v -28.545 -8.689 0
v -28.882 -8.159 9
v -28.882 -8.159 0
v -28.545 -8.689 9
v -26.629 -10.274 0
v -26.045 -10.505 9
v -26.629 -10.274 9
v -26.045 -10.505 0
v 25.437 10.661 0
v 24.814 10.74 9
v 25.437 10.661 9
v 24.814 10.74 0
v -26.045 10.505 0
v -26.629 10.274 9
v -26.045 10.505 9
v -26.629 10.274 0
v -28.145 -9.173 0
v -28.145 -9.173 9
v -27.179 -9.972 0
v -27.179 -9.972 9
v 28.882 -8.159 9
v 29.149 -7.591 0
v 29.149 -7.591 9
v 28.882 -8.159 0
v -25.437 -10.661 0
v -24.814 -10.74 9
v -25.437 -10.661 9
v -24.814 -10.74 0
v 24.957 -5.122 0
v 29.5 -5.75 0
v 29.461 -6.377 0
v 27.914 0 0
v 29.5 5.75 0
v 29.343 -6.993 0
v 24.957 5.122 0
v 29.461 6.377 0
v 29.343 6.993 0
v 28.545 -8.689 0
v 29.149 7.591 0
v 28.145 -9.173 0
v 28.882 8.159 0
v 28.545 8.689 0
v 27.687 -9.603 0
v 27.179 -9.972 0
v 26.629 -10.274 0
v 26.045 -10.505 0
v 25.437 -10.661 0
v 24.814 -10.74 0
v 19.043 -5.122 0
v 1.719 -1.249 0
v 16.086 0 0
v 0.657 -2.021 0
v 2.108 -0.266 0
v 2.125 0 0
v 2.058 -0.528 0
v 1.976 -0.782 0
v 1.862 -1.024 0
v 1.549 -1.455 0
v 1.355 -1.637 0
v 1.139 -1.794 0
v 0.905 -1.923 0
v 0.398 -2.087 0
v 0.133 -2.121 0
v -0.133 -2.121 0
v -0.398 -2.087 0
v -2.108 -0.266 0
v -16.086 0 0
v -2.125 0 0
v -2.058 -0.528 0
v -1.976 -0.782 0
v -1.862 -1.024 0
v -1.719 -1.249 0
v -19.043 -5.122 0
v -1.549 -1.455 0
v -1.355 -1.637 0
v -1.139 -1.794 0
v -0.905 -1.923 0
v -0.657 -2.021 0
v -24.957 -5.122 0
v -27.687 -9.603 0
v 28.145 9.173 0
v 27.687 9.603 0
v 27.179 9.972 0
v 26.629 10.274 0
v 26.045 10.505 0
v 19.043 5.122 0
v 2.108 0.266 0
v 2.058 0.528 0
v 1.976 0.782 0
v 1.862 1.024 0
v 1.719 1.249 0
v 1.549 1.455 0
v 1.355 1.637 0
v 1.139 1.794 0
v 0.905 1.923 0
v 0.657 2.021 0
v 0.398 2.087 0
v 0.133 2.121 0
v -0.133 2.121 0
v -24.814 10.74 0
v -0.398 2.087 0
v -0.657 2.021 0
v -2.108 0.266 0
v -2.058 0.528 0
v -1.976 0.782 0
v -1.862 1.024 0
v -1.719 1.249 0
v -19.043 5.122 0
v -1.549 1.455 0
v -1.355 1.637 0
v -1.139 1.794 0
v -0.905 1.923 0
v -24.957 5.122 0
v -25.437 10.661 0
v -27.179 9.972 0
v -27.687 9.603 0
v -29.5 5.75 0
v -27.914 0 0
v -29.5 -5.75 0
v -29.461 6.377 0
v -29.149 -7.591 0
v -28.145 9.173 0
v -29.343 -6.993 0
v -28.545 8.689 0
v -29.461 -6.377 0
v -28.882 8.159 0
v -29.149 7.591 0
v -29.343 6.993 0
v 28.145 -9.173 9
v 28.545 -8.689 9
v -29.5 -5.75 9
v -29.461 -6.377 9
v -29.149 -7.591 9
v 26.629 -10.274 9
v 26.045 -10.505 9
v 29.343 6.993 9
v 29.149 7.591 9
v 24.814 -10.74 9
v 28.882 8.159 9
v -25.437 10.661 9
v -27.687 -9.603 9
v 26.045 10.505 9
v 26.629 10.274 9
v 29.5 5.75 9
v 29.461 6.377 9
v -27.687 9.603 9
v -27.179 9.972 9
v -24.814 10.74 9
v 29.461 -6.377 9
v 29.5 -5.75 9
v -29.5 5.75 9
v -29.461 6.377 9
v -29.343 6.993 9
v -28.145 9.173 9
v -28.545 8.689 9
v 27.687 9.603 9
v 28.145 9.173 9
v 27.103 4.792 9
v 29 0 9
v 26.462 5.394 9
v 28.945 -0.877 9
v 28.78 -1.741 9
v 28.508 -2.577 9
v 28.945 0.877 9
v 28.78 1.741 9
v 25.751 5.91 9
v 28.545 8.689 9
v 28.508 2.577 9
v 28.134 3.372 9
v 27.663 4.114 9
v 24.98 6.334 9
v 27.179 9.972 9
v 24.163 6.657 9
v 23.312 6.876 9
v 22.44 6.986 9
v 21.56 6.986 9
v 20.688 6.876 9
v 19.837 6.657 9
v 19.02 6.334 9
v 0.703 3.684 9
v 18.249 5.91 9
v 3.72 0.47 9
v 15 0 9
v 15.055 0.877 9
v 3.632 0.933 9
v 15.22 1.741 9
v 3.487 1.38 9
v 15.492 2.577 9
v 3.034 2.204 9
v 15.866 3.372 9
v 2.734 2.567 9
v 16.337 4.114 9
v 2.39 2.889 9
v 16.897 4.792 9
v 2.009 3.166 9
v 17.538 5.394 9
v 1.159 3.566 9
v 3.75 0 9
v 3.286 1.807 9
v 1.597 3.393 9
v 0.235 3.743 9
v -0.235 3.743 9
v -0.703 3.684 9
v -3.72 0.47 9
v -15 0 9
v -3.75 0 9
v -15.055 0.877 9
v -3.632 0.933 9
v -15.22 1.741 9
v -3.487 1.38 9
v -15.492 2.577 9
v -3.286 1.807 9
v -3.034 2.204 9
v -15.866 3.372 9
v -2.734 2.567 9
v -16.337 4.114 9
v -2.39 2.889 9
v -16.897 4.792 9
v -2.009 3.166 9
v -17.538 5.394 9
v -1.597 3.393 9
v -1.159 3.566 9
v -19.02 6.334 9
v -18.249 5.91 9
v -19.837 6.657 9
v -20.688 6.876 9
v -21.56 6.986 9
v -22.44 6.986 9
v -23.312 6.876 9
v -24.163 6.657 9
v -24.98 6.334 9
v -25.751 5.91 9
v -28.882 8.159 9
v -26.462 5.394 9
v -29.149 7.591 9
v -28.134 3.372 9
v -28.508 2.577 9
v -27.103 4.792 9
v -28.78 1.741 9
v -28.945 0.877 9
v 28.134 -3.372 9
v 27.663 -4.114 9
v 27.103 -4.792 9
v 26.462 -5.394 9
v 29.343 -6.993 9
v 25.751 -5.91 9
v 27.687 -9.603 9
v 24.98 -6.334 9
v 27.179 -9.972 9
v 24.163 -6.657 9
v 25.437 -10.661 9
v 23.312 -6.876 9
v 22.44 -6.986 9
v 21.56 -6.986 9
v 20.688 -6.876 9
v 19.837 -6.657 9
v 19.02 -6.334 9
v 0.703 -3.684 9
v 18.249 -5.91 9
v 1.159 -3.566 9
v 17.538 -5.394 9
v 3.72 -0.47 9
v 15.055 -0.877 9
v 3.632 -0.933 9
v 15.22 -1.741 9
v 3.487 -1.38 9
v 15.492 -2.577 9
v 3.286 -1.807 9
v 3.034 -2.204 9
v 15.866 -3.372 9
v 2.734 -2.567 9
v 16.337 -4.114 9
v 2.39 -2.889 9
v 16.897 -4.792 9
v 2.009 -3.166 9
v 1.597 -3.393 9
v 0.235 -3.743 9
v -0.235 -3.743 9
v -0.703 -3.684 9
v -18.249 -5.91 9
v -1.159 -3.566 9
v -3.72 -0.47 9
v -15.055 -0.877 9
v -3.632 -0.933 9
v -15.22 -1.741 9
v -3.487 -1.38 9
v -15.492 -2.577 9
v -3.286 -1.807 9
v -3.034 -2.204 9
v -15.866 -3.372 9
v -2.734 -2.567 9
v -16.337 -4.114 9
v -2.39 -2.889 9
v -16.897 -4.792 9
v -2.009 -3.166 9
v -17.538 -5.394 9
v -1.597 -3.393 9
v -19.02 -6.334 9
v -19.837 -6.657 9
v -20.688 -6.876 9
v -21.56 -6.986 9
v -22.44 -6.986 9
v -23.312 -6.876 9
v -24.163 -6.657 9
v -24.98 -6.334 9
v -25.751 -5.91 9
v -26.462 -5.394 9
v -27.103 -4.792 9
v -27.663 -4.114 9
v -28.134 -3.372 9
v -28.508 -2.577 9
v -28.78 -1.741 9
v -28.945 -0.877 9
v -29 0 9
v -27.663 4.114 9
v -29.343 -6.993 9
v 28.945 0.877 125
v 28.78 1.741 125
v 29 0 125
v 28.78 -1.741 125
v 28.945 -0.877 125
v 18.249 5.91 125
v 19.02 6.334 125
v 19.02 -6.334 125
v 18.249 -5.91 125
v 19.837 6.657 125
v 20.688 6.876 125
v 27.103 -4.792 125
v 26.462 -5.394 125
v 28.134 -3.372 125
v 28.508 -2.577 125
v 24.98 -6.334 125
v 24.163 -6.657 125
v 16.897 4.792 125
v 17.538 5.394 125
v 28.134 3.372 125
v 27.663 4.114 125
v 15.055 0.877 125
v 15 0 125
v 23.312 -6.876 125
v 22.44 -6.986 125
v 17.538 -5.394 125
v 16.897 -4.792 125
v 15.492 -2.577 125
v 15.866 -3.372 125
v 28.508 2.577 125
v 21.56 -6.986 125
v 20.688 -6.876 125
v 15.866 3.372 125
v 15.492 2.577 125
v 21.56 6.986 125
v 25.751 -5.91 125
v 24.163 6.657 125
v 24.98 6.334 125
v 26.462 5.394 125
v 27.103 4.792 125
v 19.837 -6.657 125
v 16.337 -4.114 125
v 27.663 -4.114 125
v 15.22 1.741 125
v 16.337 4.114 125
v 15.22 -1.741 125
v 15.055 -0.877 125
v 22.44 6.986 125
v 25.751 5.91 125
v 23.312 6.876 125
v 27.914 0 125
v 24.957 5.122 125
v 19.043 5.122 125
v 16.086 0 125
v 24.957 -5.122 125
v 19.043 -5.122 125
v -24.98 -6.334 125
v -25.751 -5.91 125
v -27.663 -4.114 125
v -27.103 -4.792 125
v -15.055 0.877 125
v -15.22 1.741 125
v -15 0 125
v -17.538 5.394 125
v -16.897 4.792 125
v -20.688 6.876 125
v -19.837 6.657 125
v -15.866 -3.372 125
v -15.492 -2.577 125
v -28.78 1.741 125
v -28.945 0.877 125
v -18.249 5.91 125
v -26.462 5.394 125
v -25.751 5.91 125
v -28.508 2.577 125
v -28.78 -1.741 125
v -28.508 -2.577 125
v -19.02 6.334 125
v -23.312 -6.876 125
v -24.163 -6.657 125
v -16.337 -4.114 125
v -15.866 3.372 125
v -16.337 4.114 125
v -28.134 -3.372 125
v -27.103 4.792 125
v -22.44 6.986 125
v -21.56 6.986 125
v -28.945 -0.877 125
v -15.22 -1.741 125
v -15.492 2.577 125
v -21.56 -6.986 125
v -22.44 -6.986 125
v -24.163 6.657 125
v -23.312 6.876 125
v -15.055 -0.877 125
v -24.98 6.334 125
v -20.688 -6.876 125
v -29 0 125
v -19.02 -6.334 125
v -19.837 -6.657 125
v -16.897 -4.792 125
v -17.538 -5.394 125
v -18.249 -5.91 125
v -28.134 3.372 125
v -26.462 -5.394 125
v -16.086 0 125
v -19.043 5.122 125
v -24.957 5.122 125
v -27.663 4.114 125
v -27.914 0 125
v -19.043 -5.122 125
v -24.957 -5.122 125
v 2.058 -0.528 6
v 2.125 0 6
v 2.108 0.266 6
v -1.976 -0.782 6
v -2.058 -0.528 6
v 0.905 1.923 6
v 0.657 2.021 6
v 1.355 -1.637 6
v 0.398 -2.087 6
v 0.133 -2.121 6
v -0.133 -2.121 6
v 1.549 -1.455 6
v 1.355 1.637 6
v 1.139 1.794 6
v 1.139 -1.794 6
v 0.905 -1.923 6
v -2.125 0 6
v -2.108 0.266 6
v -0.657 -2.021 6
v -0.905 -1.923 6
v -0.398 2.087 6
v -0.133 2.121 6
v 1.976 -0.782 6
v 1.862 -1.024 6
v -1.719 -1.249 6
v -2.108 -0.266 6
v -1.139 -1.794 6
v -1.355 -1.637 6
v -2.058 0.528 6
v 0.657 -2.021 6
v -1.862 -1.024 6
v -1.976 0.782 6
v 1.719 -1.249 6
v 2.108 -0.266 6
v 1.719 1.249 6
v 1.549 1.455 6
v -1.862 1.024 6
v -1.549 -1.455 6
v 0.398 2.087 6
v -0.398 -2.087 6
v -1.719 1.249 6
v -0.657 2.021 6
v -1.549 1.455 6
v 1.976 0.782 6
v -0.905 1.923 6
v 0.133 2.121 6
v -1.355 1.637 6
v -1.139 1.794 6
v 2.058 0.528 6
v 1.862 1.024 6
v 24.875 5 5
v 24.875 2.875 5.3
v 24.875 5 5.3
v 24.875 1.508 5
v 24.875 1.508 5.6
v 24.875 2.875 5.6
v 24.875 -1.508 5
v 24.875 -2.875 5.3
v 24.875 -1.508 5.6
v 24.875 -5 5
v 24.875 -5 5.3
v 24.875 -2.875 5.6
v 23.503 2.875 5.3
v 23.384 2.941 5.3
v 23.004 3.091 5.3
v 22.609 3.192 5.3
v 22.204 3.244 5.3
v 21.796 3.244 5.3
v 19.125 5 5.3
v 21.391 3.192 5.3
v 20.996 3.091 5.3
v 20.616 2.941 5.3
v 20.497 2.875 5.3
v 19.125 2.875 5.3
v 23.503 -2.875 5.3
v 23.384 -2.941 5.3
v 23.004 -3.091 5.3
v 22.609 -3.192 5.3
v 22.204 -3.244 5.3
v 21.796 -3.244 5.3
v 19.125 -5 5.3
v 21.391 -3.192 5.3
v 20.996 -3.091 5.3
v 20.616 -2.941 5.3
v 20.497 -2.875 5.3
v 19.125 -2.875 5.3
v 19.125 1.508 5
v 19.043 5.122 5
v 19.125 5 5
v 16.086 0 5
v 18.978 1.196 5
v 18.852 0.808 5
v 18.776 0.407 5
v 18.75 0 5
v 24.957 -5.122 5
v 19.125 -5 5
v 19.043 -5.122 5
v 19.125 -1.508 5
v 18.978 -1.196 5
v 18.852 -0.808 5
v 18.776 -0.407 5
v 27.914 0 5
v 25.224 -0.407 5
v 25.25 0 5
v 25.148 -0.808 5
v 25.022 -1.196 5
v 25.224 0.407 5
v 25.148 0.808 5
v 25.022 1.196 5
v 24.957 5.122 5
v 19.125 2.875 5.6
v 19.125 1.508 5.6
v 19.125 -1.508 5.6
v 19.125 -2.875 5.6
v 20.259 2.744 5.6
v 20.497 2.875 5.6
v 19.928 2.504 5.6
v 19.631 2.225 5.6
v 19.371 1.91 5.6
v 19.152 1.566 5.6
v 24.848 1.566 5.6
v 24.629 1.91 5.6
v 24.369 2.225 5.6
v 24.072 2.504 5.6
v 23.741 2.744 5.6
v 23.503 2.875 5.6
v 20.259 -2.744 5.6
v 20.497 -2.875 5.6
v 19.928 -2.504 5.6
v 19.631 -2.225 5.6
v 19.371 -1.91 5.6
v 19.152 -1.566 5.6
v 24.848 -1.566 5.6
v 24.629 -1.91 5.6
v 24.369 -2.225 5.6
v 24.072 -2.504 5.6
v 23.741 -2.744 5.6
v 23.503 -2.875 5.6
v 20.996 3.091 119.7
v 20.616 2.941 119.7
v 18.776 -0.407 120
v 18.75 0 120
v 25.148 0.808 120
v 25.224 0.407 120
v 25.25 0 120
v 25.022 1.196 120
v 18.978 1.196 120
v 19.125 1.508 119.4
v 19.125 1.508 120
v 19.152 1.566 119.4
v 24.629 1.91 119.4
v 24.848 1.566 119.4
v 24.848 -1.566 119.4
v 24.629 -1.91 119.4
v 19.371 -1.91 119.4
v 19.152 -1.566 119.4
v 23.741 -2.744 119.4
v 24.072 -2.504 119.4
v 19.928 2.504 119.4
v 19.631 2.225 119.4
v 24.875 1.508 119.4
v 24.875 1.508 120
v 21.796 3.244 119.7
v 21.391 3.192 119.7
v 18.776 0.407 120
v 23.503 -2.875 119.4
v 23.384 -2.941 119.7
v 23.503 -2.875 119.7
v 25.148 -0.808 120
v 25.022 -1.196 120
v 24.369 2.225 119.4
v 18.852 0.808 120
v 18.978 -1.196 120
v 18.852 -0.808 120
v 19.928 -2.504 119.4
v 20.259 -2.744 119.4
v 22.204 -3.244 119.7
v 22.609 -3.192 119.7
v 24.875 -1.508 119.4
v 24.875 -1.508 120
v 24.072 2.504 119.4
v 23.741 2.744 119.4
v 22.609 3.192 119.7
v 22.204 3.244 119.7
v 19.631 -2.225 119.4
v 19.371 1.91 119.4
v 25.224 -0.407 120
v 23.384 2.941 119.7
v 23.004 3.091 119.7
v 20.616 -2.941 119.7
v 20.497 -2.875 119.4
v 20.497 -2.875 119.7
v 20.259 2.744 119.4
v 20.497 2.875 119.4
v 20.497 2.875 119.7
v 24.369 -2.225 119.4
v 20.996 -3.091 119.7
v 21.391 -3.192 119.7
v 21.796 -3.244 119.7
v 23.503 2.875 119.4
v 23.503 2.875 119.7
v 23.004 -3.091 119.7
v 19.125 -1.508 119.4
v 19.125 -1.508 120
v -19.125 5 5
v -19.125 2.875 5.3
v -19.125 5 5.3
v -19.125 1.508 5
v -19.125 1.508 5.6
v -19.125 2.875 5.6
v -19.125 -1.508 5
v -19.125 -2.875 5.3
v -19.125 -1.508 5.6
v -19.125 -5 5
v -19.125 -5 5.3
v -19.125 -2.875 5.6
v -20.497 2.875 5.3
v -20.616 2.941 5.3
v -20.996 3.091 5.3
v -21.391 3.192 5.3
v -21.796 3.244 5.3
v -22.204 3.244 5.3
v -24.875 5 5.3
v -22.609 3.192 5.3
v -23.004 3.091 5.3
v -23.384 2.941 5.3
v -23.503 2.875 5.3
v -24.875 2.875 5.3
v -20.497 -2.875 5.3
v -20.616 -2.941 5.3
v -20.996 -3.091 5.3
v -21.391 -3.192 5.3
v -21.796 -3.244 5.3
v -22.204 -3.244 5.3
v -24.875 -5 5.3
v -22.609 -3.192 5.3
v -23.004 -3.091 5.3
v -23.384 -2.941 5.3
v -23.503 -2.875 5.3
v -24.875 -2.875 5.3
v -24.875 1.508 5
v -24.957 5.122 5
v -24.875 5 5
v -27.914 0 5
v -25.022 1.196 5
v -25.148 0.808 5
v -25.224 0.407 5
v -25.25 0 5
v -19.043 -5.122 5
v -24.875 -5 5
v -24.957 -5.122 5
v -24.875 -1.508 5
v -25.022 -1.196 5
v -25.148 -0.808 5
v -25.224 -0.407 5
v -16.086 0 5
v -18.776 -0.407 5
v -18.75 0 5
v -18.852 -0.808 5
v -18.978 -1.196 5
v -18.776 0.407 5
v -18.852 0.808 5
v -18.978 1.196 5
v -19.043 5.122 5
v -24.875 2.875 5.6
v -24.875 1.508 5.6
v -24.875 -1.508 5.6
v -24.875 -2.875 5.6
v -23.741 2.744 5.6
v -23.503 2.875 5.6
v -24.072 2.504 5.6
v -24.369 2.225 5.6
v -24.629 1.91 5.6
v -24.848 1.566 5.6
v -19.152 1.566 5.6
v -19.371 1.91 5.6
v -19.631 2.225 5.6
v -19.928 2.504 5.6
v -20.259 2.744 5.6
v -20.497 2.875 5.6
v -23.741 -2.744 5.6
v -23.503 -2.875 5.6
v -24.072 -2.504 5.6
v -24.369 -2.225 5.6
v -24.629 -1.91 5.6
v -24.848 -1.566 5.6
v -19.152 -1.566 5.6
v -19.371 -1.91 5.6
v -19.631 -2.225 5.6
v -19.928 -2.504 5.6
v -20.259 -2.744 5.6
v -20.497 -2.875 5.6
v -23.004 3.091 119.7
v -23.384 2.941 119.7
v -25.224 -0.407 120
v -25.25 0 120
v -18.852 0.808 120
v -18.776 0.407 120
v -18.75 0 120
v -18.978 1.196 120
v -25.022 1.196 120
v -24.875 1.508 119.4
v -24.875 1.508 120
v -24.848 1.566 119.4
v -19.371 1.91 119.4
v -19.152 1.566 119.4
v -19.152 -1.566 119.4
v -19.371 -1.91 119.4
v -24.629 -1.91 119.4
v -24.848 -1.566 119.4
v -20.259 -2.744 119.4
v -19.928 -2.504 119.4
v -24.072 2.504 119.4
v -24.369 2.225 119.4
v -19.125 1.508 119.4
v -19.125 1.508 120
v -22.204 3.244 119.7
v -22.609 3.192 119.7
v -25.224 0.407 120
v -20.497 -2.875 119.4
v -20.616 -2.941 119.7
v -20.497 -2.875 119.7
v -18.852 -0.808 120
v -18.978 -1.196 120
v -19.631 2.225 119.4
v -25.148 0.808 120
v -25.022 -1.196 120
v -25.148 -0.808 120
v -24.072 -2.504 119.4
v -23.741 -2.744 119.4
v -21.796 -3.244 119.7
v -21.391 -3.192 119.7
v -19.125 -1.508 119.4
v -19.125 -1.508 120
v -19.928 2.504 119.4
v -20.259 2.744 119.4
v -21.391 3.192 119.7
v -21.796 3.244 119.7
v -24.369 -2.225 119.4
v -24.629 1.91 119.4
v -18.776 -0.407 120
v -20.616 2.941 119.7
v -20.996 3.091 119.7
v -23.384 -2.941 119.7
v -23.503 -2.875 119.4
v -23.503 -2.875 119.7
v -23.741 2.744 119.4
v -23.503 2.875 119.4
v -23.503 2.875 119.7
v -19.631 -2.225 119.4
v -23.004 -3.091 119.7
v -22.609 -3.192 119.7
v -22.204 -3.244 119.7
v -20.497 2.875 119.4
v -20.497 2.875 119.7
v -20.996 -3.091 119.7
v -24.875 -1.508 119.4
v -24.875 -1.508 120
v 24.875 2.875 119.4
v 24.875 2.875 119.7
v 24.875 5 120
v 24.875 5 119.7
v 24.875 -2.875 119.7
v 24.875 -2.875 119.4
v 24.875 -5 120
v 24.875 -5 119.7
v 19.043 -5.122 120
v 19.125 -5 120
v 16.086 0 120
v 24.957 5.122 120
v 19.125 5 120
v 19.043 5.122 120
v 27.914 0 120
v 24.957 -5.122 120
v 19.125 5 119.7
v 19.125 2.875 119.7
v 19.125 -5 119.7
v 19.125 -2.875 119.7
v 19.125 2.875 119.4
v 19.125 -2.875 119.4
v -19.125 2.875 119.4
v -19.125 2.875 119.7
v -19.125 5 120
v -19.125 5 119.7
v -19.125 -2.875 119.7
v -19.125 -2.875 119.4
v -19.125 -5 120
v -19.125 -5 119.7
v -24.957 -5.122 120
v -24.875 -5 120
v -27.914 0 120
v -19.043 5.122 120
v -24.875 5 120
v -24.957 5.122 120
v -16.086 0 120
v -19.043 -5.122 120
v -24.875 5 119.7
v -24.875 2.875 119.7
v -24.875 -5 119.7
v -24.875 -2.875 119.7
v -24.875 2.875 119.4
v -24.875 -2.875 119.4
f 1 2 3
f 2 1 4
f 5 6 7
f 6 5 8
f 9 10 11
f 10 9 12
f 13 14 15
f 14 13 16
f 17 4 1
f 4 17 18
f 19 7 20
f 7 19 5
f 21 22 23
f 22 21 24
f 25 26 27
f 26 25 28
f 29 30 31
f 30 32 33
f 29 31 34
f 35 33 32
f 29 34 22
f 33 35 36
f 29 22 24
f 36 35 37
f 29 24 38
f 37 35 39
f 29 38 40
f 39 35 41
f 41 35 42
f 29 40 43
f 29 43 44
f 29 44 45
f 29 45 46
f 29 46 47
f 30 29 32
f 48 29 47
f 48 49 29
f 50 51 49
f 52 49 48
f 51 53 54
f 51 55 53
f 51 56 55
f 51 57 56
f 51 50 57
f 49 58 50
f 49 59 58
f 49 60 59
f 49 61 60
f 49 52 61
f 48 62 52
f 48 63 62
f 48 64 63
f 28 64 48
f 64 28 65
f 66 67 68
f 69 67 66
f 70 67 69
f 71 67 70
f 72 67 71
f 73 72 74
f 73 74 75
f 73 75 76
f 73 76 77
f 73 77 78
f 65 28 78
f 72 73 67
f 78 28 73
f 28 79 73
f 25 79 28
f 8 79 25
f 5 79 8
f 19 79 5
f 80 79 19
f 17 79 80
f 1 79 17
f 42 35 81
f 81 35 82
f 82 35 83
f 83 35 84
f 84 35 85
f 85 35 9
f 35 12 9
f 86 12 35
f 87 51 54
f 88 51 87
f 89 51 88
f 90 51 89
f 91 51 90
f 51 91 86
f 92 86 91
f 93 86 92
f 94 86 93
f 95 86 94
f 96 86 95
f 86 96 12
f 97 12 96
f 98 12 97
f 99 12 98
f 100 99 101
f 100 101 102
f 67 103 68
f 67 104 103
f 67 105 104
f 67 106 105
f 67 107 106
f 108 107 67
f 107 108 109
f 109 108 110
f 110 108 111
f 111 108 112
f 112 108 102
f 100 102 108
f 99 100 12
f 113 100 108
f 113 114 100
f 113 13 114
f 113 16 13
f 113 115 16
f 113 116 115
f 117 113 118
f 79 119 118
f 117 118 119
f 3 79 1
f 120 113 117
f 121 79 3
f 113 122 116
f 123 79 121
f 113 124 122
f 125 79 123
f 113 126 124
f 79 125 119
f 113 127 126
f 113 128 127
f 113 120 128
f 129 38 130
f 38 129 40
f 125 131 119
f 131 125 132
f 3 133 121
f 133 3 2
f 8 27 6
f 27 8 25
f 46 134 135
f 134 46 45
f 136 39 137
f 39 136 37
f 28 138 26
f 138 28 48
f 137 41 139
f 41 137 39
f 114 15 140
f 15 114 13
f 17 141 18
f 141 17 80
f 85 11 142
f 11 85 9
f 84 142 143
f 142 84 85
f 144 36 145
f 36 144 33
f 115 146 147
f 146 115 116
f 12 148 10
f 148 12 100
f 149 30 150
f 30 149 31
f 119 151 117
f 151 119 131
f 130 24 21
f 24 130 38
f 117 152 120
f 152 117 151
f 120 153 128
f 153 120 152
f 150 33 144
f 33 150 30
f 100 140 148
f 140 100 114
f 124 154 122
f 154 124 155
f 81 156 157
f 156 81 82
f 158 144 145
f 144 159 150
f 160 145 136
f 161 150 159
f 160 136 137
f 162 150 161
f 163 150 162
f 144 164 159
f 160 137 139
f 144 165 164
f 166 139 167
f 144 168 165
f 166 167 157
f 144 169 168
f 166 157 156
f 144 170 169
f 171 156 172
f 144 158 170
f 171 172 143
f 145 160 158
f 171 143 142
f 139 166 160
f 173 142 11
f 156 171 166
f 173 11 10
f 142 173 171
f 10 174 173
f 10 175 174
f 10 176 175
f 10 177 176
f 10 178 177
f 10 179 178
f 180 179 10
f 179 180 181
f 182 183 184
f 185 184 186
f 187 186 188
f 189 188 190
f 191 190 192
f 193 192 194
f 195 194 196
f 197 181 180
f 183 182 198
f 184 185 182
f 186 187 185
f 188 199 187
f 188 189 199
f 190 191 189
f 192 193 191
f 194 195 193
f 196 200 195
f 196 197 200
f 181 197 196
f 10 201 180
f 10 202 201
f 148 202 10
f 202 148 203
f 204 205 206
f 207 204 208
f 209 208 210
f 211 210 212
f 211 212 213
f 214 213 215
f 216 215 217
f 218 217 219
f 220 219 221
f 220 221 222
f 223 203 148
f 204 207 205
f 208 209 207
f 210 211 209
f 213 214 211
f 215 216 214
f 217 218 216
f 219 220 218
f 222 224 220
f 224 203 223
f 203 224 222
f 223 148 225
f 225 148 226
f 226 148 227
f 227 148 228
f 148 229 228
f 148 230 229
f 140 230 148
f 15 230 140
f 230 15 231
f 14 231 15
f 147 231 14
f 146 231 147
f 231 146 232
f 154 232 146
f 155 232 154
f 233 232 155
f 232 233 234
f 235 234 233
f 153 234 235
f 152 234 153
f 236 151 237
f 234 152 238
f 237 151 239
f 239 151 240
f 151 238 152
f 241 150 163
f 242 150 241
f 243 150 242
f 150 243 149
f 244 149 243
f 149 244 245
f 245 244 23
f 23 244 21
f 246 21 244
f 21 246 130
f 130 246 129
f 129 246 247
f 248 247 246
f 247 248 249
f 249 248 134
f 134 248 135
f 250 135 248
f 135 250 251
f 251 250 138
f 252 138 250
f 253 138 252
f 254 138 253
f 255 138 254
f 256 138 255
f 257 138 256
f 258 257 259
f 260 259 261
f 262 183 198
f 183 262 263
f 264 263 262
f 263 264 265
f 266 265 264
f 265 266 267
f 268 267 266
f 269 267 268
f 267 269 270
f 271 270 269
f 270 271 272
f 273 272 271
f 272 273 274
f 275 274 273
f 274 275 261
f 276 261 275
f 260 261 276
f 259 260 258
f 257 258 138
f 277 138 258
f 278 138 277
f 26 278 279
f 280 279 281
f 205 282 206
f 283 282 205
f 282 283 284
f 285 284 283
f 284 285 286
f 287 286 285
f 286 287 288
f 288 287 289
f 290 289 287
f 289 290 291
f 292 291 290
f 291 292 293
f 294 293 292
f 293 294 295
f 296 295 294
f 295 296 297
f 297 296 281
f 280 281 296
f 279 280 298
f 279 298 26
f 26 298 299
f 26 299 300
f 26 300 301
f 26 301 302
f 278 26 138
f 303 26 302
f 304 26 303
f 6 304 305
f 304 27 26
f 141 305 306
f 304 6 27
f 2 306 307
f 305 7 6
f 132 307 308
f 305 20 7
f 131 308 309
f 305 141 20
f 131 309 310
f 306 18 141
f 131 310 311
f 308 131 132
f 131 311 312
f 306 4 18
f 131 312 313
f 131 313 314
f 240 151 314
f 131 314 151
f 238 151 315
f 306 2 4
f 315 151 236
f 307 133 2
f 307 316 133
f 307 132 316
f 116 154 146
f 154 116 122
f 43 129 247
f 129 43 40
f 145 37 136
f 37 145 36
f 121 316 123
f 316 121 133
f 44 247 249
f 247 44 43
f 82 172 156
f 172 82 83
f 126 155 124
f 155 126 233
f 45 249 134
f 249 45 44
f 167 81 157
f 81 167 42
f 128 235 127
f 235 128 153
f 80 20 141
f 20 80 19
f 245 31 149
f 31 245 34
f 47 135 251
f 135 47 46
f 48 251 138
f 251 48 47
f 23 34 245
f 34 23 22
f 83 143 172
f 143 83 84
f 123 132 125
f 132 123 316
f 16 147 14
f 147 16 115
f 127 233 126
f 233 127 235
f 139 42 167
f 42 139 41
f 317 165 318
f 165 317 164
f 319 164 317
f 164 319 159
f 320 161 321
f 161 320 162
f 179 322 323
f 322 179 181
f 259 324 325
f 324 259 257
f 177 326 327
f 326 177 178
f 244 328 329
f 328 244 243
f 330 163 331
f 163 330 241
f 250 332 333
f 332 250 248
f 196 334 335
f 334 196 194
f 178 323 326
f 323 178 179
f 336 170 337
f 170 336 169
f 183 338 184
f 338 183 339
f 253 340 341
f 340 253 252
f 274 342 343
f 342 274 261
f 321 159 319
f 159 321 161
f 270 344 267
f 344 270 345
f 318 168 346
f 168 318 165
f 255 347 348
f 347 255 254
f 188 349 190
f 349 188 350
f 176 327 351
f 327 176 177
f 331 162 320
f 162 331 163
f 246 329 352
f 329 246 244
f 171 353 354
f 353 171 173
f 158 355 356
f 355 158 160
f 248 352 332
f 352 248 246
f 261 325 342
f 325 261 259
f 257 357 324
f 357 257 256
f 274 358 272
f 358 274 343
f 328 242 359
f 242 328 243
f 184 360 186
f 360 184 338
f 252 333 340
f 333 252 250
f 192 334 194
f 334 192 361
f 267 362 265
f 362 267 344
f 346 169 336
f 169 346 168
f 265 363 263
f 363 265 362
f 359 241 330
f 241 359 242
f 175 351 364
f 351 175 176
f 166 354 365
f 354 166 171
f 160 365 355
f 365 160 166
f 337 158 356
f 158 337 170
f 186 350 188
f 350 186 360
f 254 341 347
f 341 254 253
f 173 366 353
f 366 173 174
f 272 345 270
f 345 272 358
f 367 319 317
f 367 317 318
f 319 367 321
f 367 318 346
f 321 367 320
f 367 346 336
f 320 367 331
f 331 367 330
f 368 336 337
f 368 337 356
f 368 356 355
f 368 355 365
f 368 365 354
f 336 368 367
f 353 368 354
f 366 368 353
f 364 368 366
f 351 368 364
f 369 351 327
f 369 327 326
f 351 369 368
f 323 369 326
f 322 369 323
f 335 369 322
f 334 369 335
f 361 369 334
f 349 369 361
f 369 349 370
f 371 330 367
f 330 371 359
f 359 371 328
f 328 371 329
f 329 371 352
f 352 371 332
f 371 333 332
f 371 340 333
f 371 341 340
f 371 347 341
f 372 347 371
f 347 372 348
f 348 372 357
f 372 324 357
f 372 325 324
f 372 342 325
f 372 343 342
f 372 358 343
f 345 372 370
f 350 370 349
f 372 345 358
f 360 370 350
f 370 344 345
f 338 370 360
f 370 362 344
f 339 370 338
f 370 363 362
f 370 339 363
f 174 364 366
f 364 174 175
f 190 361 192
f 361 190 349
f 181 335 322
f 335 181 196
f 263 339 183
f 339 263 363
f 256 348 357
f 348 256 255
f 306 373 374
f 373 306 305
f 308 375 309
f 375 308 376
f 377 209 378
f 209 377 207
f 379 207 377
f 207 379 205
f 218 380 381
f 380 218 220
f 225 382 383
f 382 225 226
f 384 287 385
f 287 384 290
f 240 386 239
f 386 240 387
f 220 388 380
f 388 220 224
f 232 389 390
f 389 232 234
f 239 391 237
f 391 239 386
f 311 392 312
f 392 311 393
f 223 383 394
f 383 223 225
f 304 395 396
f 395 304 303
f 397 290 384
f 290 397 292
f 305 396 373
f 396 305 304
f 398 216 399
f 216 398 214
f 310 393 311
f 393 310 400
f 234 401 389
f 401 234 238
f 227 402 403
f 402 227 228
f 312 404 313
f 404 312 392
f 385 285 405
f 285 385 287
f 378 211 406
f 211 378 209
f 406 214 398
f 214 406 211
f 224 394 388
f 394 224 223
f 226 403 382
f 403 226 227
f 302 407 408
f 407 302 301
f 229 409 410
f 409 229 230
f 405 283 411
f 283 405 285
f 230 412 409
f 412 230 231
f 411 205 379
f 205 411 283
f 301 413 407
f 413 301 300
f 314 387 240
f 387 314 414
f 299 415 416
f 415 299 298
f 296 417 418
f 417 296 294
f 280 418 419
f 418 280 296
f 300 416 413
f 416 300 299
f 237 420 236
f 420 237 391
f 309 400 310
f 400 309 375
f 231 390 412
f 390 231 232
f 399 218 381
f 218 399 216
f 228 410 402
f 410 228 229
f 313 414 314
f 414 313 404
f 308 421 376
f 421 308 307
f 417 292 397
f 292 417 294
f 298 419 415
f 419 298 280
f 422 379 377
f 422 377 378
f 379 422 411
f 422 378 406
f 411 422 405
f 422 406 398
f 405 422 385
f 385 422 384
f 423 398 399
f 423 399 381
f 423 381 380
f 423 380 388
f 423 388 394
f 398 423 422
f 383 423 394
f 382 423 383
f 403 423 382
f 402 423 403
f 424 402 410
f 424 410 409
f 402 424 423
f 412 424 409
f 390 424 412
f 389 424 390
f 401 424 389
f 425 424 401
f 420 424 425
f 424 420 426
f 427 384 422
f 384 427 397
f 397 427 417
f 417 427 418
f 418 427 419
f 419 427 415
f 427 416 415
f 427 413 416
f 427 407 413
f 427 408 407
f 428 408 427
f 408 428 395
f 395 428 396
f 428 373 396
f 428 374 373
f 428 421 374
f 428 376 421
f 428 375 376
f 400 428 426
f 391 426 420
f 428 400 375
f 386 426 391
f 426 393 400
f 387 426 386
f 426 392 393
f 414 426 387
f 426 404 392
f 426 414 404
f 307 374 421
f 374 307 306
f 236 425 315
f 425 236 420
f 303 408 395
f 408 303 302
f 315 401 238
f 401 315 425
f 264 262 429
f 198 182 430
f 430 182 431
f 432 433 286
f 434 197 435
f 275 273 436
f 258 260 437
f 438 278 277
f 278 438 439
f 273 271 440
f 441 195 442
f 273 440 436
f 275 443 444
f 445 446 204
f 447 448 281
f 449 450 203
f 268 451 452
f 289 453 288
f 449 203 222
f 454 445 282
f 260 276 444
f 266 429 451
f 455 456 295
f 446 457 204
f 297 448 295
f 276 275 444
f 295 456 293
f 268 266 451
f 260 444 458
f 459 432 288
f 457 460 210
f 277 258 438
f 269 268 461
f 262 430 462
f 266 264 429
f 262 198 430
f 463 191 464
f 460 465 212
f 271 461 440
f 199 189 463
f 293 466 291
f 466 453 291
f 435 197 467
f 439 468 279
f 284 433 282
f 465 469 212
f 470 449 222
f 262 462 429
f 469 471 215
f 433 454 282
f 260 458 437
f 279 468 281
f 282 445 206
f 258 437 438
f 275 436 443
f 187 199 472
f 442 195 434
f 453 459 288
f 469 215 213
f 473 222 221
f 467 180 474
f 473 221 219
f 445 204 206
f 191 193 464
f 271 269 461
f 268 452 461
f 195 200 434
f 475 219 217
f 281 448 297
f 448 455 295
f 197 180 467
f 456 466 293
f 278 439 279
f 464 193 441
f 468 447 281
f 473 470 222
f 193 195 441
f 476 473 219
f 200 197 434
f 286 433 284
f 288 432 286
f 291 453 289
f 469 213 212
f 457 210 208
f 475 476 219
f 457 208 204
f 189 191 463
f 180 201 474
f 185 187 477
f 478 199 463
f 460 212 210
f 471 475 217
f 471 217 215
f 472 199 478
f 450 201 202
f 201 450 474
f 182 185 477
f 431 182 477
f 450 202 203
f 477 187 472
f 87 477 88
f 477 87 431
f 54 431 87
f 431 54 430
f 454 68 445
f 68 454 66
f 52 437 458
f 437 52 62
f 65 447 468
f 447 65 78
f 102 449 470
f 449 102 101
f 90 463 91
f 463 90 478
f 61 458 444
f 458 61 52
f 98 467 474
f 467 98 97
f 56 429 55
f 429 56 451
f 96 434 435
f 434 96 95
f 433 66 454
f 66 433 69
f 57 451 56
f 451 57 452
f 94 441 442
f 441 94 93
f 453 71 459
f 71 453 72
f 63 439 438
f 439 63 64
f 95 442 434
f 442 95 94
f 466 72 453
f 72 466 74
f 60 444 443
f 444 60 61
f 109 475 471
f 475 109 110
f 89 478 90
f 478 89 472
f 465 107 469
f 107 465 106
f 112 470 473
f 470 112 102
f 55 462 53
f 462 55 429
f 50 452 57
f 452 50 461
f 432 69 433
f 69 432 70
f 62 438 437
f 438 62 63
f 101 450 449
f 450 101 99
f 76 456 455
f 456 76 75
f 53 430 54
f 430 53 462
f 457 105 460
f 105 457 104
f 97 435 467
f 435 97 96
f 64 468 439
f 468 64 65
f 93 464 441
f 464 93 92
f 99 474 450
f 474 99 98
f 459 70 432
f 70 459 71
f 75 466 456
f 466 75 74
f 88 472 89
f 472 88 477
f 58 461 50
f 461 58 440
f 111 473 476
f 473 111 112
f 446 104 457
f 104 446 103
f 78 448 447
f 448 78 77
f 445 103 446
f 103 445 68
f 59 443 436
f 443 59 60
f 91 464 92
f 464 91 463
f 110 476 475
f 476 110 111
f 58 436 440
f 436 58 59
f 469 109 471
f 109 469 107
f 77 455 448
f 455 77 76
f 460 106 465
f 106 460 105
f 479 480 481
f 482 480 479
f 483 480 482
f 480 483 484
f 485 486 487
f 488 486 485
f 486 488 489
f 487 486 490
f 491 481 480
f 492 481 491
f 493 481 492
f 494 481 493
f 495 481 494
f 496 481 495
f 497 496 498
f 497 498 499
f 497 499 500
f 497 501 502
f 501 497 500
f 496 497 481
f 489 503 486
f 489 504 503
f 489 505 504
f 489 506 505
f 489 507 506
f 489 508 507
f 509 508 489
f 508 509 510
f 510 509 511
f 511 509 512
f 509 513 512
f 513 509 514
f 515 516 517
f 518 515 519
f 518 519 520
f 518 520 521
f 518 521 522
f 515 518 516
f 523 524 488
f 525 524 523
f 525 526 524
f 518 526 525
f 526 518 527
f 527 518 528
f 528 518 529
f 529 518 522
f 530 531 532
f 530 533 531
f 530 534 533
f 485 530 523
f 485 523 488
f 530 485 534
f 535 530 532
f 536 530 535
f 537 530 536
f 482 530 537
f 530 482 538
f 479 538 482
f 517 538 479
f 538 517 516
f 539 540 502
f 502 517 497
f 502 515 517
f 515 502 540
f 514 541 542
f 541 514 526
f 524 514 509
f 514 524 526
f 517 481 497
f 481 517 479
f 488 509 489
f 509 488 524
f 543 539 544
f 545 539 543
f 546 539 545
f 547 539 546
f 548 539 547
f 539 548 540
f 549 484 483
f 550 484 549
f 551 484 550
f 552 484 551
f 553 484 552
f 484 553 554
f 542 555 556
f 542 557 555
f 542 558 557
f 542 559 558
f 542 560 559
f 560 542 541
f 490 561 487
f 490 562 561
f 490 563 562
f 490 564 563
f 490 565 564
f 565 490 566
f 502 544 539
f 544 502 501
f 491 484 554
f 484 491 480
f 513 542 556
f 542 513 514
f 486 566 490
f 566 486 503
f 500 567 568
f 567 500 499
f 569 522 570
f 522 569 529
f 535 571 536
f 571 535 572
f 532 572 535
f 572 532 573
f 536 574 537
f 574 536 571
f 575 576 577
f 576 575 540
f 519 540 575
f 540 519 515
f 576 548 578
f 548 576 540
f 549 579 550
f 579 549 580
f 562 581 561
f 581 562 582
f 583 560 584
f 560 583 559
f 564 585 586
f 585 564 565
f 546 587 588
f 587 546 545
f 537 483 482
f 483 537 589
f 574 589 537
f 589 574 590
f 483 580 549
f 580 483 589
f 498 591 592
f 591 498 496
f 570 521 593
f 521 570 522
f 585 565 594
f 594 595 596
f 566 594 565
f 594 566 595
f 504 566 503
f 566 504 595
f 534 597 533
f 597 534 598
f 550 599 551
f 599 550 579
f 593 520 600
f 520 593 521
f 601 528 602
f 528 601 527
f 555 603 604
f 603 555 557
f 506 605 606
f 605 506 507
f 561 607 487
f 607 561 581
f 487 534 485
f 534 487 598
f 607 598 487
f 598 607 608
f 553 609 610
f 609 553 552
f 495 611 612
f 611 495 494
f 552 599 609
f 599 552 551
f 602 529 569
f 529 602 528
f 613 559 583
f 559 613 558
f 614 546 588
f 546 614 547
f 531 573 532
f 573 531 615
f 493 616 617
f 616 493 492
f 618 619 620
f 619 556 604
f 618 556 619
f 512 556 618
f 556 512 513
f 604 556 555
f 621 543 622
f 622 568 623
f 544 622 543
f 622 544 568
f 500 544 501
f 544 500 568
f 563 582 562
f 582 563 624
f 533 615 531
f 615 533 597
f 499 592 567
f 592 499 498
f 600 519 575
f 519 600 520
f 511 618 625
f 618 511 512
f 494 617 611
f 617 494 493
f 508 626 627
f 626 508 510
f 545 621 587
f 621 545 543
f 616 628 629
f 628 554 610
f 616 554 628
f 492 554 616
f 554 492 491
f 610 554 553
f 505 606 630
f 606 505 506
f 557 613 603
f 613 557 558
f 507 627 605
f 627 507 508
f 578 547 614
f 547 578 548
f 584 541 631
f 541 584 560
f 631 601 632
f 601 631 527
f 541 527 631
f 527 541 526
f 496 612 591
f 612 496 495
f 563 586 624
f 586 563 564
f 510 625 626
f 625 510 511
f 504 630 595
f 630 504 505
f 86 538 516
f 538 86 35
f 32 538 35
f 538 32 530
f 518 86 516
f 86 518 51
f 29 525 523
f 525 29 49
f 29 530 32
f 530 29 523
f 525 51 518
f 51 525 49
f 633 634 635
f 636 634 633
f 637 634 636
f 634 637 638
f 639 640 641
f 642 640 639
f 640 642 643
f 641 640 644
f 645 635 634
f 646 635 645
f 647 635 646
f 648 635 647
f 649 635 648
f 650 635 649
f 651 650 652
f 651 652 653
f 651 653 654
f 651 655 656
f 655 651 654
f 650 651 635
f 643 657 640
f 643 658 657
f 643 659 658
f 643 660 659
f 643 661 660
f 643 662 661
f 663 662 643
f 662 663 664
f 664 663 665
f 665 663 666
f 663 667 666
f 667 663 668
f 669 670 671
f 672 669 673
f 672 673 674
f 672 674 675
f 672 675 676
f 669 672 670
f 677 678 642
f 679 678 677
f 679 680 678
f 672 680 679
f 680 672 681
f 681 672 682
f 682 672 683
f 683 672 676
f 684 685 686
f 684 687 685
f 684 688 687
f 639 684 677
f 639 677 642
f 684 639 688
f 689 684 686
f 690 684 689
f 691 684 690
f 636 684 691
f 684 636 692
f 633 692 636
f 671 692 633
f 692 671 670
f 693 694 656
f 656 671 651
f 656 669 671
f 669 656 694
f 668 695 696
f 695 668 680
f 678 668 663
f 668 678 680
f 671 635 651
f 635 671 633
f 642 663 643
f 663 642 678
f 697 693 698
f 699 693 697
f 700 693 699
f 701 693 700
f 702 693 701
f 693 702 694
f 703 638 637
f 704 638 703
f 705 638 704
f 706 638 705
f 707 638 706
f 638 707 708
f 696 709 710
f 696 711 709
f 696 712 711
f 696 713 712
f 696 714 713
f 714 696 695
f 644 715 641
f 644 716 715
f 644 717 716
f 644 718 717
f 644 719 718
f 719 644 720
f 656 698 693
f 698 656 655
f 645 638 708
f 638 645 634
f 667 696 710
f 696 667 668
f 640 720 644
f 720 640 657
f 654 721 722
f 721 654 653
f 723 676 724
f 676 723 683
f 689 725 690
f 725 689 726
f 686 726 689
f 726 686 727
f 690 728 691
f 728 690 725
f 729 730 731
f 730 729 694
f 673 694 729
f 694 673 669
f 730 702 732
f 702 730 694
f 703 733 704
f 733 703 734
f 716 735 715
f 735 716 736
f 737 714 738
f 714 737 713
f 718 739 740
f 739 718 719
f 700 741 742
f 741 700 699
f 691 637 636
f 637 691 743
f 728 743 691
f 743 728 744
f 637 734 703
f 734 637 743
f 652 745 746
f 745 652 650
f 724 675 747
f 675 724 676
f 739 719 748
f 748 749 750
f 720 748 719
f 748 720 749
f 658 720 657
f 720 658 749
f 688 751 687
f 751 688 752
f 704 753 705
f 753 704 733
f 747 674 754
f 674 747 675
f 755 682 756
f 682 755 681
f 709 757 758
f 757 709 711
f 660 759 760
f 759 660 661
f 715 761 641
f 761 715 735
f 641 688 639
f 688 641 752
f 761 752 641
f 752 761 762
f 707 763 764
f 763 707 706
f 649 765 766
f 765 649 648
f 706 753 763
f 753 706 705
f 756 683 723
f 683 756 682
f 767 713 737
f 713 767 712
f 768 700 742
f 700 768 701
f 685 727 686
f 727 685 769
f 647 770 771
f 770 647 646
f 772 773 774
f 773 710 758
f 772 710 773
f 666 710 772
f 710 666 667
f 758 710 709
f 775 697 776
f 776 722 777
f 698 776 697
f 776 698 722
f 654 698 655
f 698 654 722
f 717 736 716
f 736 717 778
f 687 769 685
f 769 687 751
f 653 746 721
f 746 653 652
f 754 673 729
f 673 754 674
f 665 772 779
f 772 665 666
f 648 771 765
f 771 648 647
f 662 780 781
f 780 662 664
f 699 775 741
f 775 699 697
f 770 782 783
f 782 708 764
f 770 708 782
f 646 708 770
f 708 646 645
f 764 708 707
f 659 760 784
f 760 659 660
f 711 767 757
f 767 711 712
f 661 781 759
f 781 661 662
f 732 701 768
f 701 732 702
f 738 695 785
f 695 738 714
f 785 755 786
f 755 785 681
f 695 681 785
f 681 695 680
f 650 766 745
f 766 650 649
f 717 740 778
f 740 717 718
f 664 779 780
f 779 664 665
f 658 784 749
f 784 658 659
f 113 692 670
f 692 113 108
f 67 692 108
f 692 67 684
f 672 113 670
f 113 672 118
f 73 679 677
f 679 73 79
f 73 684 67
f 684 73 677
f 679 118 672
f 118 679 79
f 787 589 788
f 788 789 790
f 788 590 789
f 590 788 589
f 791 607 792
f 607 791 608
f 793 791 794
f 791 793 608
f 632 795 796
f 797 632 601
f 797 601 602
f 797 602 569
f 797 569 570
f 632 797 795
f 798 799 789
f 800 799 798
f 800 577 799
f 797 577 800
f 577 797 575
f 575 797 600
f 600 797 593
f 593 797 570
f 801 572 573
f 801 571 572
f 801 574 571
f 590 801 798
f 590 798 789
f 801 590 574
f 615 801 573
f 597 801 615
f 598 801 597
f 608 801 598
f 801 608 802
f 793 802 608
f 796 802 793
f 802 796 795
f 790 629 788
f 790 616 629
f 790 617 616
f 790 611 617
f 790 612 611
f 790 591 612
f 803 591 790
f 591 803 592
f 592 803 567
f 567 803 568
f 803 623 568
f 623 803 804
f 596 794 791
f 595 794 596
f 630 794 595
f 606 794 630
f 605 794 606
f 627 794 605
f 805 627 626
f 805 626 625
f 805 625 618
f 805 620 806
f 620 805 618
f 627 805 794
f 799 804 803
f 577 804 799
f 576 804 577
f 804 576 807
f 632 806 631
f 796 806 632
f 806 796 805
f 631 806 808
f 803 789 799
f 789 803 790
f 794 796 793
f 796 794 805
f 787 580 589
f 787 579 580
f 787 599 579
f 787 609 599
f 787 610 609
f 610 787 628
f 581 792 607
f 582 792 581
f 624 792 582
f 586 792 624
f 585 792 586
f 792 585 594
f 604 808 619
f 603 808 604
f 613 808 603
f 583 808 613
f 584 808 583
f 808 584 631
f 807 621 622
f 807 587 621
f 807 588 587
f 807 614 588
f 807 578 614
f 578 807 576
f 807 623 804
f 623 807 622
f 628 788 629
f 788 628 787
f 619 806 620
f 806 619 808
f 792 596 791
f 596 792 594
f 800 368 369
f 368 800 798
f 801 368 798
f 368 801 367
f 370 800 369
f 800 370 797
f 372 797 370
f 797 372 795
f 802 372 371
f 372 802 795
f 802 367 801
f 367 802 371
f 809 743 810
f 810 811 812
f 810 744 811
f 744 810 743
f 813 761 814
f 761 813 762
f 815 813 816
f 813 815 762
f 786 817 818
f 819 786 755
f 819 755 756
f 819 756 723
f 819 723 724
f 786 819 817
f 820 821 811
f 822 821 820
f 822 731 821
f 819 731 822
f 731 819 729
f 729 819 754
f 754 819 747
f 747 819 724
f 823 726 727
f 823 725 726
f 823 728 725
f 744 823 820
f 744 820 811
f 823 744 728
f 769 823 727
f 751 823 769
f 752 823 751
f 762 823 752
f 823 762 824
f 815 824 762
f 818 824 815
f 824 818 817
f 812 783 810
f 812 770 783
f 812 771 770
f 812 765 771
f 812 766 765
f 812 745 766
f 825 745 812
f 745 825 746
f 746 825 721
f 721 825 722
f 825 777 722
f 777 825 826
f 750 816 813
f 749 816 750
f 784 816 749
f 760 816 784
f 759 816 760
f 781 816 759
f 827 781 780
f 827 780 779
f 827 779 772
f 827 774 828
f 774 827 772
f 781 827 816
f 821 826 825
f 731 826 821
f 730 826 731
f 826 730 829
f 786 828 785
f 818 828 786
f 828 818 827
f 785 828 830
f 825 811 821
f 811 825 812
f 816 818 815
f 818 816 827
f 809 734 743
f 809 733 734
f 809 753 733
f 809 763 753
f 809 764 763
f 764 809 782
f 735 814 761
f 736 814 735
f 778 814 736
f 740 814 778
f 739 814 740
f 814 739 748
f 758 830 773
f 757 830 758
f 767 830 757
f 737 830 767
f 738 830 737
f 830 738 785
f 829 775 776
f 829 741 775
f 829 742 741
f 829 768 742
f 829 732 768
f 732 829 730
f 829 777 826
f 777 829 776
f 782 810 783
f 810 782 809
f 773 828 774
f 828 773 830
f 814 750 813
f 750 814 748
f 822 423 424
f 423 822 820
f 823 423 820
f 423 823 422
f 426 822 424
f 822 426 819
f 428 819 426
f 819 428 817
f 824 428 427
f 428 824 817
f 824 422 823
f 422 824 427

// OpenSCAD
$fn = 50;


difference() {
	union() {
		hull() {
			translate(v = [-24.5000000000, 5.7500000000, 0]) {
				cylinder(h = 9, r = 5);
			}
			translate(v = [24.5000000000, 5.7500000000, 0]) {
				cylinder(h = 9, r = 5);
			}
			translate(v = [-24.5000000000, -5.7500000000, 0]) {
				cylinder(h = 9, r = 5);
			}
			translate(v = [24.5000000000, -5.7500000000, 0]) {
				cylinder(h = 9, r = 5);
			}
		}
		translate(v = [22.0000000000, 0, 0.0000000000]) {
			cylinder(h = 125, r = 7.0000000000);
		}
		translate(v = [-22.0000000000, 0, 0.0000000000]) {
			cylinder(h = 125, r = 7.0000000000);
		}
		translate(v = [22.0000000000, 0, 119.0000000000]) {
			cylinder(h = 6, r = 7.0000000000);
		}
		translate(v = [-22.0000000000, 0, 119.0000000000]) {
			cylinder(h = 6, r = 7.0000000000);
		}
	}
	union() {
		translate(v = [0, 0, 9]) {
			rotate(a = [0, 0, 0]) {
				difference() {
					union() {
						#translate(v = [0, 0, -120.0000000000]) {
							cylinder(h = 120, r = 2.0000000000);
						}
						#translate(v = [0, 0, -3]) {
							cylinder(h = 3, r1 = 2.1250000000, r2 = 3.7500000000);
						}
						#translate(v = [0, 0, -120.0000000000]) {
							cylinder(h = 120, r = 2.1250000000);
						}
						#translate(v = [0, 0, -120.0000000000]) {
							cylinder(h = 120, r = 2.0000000000);
						}
					}
					union();
				}
			}
		}
		translate(v = [22.0000000000, 0, 0]) {
			rotate(a = [0, 0, 0]) {
				difference() {
					union() {
						#translate(v = [-2.8750000000, -5.0000000000, -0.3000000000]) {
							cube(size = [5.7500000000, 10, 0.3000000000]);
						}
						#translate(v = [-2.8750000000, -2.8750000000, -0.6000000000]) {
							cube(size = [5.7500000000, 5.7500000000, 0.3000000000]);
						}
						#translate(v = [-2.8750000000, -5.0000000000, 5]) {
							cube(size = [5.7500000000, 10, 0.3000000000]);
						}
						#translate(v = [-2.8750000000, -2.8750000000, 5.3000000000]) {
							cube(size = [5.7500000000, 5.7500000000, 0.3000000000]);
						}
						#translate(v = [0, 0, -100.0000000000]) {
							cylinder(h = 200, r = 3.2500000000);
						}
						#linear_extrude(height = 5) {
							polygon(points = [[5.9142500000, 0.0000000000], [2.9571250000, 5.1218907443], [-2.9571250000, 5.1218907443], [-5.9142500000, 0.0000000000], [-2.9571250000, -5.1218907443], [2.9571250000, -5.1218907443]]);
						}
						#translate(v = [-2.8750000000, -5.0000000000, -0.3000000000]) {
							cube(size = [5.7500000000, 10, 0.3000000000]);
						}
						#translate(v = [-2.8750000000, -2.8750000000, -0.6000000000]) {
							cube(size = [5.7500000000, 5.7500000000, 0.3000000000]);
						}
						#translate(v = [-2.8750000000, -5.0000000000, 5]) {
							cube(size = [5.7500000000, 10, 0.3000000000]);
						}
						#translate(v = [-2.8750000000, -2.8750000000, 5.3000000000]) {
							cube(size = [5.7500000000, 5.7500000000, 0.3000000000]);
						}
						#translate(v = [0, 0, -100.0000000000]) {
							cylinder(h = 200, r = 3.2500000000);
						}
						#translate(v = [-2.8750000000, -5.0000000000, -0.3000000000]) {
							cube(size = [5.7500000000, 10, 0.3000000000]);
						}
						#translate(v = [-2.8750000000, -2.8750000000, -0.6000000000]) {
							cube(size = [5.7500000000, 5.7500000000, 0.3000000000]);
						}
						#translate(v = [-2.8750000000, -5.0000000000, 5]) {
							cube(size = [5.7500000000, 10, 0.3000000000]);
						}
						#translate(v = [-2.8750000000, -2.8750000000, 5.3000000000]) {
							cube(size = [5.7500000000, 5.7500000000, 0.3000000000]);
						}
						#translate(v = [0, 0, -100.0000000000]) {
							cylinder(h = 200, r = 3.2500000000);
						}
					}
					union();
				}
			}
		}
		translate(v = [-22.0000000000, 0, 0]) {
			rotate(a = [0, 0, 0]) {
				difference() {
					union() {
						#translate(v = [-2.8750000000, -5.0000000000, -0.3000000000]) {
							cube(size = [5.7500000000, 10, 0.3000000000]);
						}
						#translate(v = [-2.8750000000, -2.8750000000, -0.6000000000]) {
							cube(size = [5.7500000000, 5.7500000000, 0.3000000000]);
						}
						#translate(v = [-2.8750000000, -5.0000000000, 5]) {
							cube(size = [5.7500000000, 10, 0.3000000000]);
						}
						#translate(v = [-2.8750000000, -2.8750000000, 5.3000000000]) {
							cube(size = [5.7500000000, 5.7500000000, 0.3000000000]);
						}
						#translate(v = [0, 0, -100.0000000000]) {
							cylinder(h = 200, r = 3.2500000000);
						}
						#linear_extrude(height = 5) {
							polygon(points = [[5.9142500000, 0.0000000000], [2.9571250000, 5.1218907443], [-2.9571250000, 5.1218907443], [-5.9142500000, 0.0000000000], [-2.9571250000, -5.1218907443], [2.9571250000, -5.1218907443]]);
						}
						#translate(v = [-2.8750000000, -5.0000000000, -0.3000000000]) {
							cube(size = [5.7500000000, 10, 0.3000000000]);
						}
						#translate(v = [-2.8750000000, -2.8750000000, -0.6000000000]) {
							cube(size = [5.7500000000, 5.7500000000, 0.3000000000]);
						}
						#translate(v = [-2.8750000000, -5.0000000000, 5]) {
							cube(size = [5.7500000000, 10, 0.3000000000]);
						}
						#translate(v = [-2.8750000000, -2.8750000000, 5.3000000000]) {
							cube(size = [5.7500000000, 5.7500000000, 0.3000000000]);
						}
						#translate(v = [0, 0, -100.0000000000]) {
							cylinder(h = 200, r = 3.2500000000);
						}
						#translate(v = [-2.8750000000, -5.0000000000, -0.3000000000]) {
							cube(size = [5.7500000000, 10, 0.3000000000]);
						}
						#translate(v = [-2.8750000000, -2.8750000000, -0.6000000000]) {
							cube(size = [5.7500000000, 5.7500000000, 0.3000000000]);
						}
						#translate(v = [-2.8750000000, -5.0000000000, 5]) {
							cube(size = [5.7500000000, 10, 0.3000000000]);
						}
						#translate(v = [-2.8750000000, -2.8750000000, 5.3000000000]) {
							cube(size = [5.7500000000, 5.7500000000, 0.3000000000]);
						}
						#translate(v = [0, 0, -100.0000000000]) {
							cylinder(h = 200, r = 3.2500000000);
						}
					}
					union();
				}
			}
		}
		translate(v = [22.0000000000, 0, 125]) {
			rotate(a = [0, 0, 0]) {
				difference() {
					union() {
						#translate(v = [-2.8750000000, -5.0000000000, -5.3000000000]) {
							cube(size = [5.7500000000, 10, 0.3000000000]);
						}
						#translate(v = [-2.8750000000, -2.8750000000, -5.6000000000]) {
							cube(size = [5.7500000000, 5.7500000000, 0.3000000000]);
						}
						#translate(v = [-2.8750000000, -5.0000000000, 0]) {
							cube(size = [5.7500000000, 10, 0.3000000000]);
						}
						#translate(v = [-2.8750000000, -2.8750000000, 0.3000000000]) {
							cube(size = [5.7500000000, 5.7500000000, 0.3000000000]);
						}
						#translate(v = [0, 0, -100.0000000000]) {
							cylinder(h = 200, r = 3.2500000000);
						}
						translate(v = [0, 0, -5]) {
							#linear_extrude(height = 5) {
								polygon(points = [[5.9142500000, 0.0000000000], [2.9571250000, 5.1218907443], [-2.9571250000, 5.1218907443], [-5.9142500000, 0.0000000000], [-2.9571250000, -5.1218907443], [2.9571250000, -5.1218907443]]);
							}
						}
						#translate(v = [-2.8750000000, -5.0000000000, -5.3000000000]) {
							cube(size = [5.7500000000, 10, 0.3000000000]);
						}
						#translate(v = [-2.8750000000, -2.8750000000, -5.6000000000]) {
							cube(size = [5.7500000000, 5.7500000000, 0.3000000000]);
						}
						#translate(v = [-2.8750000000, -5.0000000000, 0]) {
							cube(size = [5.7500000000, 10, 0.3000000000]);
						}
						#translate(v = [-2.8750000000, -2.8750000000, 0.3000000000]) {
							cube(size = [5.7500000000, 5.7500000000, 0.3000000000]);
						}
						#translate(v = [0, 0, -100.0000000000]) {
							cylinder(h = 200, r = 3.2500000000);
						}
						#translate(v = [-2.8750000000, -5.0000000000, -5.3000000000]) {
							cube(size = [5.7500000000, 10, 0.3000000000]);
						}
						#translate(v = [-2.8750000000, -2.8750000000, -5.6000000000]) {
							cube(size = [5.7500000000, 5.7500000000, 0.3000000000]);
						}
						#translate(v = [-2.8750000000, -5.0000000000, 0]) {
							cube(size = [5.7500000000, 10, 0.3000000000]);
						}
						#translate(v = [-2.8750000000, -2.8750000000, 0.3000000000]) {
							cube(size = [5.7500000000, 5.7500000000, 0.3000000000]);
						}
						#translate(v = [0, 0, -100.0000000000]) {
							cylinder(h = 200, r = 3.2500000000);
						}
					}
					union();
				}
			}
		}
		translate(v = [-22.0000000000, 0, 125]) {
			rotate(a = [0, 0, 0]) {
				difference() {
					union() {
						#translate(v = [-2.8750000000, -5.0000000000, -5.3000000000]) {
							cube(size = [5.7500000000, 10, 0.3000000000]);
						}
						#translate(v = [-2.8750000000, -2.8750000000, -5.6000000000]) {
							cube(size = [5.7500000000, 5.7500000000, 0.3000000000]);
						}
						#translate(v = [-2.8750000000, -5.0000000000, 0]) {
							cube(size = [5.7500000000, 10, 0.3000000000]);
						}
						#translate(v = [-2.8750000000, -2.8750000000, 0.3000000000]) {
							cube(size = [5.7500000000, 5.7500000000, 0.3000000000]);
						}
						#translate(v = [0, 0, -100.0000000000]) {
							cylinder(h = 200, r = 3.2500000000);
						}
						translate(v = [0, 0, -5]) {
							#linear_extrude(height = 5) {
								polygon(points = [[5.9142500000, 0.0000000000], [2.9571250000, 5.1218907443], [-2.9571250000, 5.1218907443], [-5.9142500000, 0.0000000000], [-2.9571250000, -5.1218907443], [2.9571250000, -5.1218907443]]);
							}
						}
						#translate(v = [-2.8750000000, -5.0000000000, -5.3000000000]) {
							cube(size = [5.7500000000, 10, 0.3000000000]);
						}
						#translate(v = [-2.8750000000, -2.8750000000, -5.6000000000]) {
							cube(size = [5.7500000000, 5.7500000000, 0.3000000000]);
						}
						#translate(v = [-2.8750000000, -5.0000000000, 0]) {
							cube(size = [5.7500000000, 10, 0.3000000000]);
						}
						#translate(v = [-2.8750000000, -2.8750000000, 0.3000000000]) {
							cube(size = [5.7500000000, 5.7500000000, 0.3000000000]);
						}
						#translate(v = [0, 0, -100.0000000000]) {
							cylinder(h = 200, r = 3.2500000000);
						}
						#translate(v = [-2.8750000000, -5.0000000000, -5.3000000000]) {
							cube(size = [5.7500000000, 10, 0.3000000000]);
						}
						#translate(v = [-2.8750000000, -2.8750000000, -5.6000000000]) {
							cube(size = [5.7500000000, 5.7500000000, 0.3000000000]);
						}
						#translate(v = [-2.8750000000, -5.0000000000, 0]) {
							cube(size = [5.7500000000, 10, 0.3000000000]);
						}
						#translate(v = [-2.8750000000, -2.8750000000, 0.3000000000]) {
							cube(size = [5.7500000000, 5.7500000000, 0.3000000000]);
						}
						#translate(v = [0, 0, -100.0000000000]) {
							cylinder(h = 200, r = 3.2500000000);
						}
					}
					union();
				}
			}
		}
	}
}
